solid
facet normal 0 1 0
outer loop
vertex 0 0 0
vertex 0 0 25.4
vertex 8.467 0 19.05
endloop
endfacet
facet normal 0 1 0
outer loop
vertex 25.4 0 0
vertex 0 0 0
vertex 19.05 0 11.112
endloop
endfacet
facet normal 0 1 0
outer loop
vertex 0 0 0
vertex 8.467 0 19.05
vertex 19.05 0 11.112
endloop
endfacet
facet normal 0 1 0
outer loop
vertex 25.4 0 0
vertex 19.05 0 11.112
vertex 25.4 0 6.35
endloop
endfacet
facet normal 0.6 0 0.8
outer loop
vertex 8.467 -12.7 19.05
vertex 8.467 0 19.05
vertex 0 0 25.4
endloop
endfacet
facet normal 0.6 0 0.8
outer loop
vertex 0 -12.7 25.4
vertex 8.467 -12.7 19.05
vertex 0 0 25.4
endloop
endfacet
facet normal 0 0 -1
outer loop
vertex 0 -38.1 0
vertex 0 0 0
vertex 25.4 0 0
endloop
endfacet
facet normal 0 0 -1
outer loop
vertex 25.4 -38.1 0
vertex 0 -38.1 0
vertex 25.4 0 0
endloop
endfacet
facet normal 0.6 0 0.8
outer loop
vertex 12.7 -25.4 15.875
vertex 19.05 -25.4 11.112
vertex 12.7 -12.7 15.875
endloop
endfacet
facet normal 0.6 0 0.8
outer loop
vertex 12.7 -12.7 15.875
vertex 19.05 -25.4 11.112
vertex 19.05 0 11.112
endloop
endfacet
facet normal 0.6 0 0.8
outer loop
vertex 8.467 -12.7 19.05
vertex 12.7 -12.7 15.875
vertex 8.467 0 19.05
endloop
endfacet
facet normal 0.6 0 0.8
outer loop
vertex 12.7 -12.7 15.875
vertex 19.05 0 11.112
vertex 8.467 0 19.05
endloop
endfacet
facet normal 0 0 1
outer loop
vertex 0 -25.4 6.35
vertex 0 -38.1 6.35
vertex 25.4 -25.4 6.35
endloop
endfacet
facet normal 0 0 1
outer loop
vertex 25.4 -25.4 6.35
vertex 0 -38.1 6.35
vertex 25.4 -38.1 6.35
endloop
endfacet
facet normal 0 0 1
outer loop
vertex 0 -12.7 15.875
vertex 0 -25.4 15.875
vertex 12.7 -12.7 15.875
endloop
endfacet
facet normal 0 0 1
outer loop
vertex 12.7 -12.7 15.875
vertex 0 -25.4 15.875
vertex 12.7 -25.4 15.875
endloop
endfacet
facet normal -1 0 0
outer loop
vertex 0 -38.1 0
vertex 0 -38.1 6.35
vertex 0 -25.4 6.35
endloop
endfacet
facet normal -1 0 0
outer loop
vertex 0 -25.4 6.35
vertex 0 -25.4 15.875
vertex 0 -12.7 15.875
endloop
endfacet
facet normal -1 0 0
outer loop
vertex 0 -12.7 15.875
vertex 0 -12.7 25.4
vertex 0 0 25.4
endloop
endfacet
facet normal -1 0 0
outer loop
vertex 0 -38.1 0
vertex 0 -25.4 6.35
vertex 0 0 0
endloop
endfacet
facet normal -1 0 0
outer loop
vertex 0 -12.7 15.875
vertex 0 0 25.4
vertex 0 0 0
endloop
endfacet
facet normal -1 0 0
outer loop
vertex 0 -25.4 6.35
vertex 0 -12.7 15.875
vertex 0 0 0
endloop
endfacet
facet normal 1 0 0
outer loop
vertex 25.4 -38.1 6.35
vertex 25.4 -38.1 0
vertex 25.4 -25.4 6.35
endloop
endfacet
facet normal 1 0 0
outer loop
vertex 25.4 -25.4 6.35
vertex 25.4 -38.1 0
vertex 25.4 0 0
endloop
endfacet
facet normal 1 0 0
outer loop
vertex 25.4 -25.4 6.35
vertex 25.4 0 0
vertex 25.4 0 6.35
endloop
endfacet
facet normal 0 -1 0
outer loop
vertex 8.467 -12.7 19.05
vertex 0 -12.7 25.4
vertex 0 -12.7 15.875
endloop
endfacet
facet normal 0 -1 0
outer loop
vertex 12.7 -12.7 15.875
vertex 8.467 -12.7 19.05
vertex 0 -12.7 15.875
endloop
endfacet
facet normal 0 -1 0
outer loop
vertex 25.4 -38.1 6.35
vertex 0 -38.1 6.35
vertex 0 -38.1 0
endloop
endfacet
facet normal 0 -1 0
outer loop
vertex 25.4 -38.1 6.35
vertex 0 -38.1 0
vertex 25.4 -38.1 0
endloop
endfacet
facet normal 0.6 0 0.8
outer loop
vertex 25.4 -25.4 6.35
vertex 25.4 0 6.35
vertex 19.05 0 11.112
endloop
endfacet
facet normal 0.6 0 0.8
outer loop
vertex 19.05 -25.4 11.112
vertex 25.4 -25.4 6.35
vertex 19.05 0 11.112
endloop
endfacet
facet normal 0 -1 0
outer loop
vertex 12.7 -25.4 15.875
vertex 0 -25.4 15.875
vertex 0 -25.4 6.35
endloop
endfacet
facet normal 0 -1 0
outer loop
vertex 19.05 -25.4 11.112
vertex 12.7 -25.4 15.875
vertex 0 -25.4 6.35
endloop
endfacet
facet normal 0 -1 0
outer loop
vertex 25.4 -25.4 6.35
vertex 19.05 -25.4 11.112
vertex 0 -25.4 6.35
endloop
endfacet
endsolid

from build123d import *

# Parameters (mm, degrees)
F1_DEPTH = 38.1
F3_DEPTH = 12.7
F5_DEPTH = 12.7


with BuildPart() as f1:
    # F0 (on Front) → F1 (new body)
    with BuildSketch(Plane.XZ):
        Polygon((0, 6.35), (0, 0), (25.4, 0), (25.4, 6.35), (19.05, 6.35), align=None)
        Polygon((0, 19.05), (0, 6.35), (19.05, 6.35), (19.05, 11.1125), (8.4666666667, 19.05), align=None)
        Polygon((19.05, 6.35), (25.4, 6.35), (19.05, 11.1125), align=None)
        Polygon((0, 25.4), (0, 19.05), (8.4666666667, 19.05), align=None)
    extrude(amount=F1_DEPTH)

    # F2 (on face) → F3 (cut)
    with BuildSketch(Plane.XZ.offset(38.1)):
        Polygon((0, 6.35), (25.4, 6.35), (0, 25.4), align=None)
    extrude(amount=-F3_DEPTH, mode=Mode.SUBTRACT)

    # F4 (on face) → F5 (cut)
    with BuildSketch(Plane.XZ.offset(25.4)):
        Polygon((0, 15.875), (12.7, 15.875), (0, 25.4), align=None)
    extrude(amount=-F5_DEPTH, mode=Mode.SUBTRACT)


solid = f1.part
